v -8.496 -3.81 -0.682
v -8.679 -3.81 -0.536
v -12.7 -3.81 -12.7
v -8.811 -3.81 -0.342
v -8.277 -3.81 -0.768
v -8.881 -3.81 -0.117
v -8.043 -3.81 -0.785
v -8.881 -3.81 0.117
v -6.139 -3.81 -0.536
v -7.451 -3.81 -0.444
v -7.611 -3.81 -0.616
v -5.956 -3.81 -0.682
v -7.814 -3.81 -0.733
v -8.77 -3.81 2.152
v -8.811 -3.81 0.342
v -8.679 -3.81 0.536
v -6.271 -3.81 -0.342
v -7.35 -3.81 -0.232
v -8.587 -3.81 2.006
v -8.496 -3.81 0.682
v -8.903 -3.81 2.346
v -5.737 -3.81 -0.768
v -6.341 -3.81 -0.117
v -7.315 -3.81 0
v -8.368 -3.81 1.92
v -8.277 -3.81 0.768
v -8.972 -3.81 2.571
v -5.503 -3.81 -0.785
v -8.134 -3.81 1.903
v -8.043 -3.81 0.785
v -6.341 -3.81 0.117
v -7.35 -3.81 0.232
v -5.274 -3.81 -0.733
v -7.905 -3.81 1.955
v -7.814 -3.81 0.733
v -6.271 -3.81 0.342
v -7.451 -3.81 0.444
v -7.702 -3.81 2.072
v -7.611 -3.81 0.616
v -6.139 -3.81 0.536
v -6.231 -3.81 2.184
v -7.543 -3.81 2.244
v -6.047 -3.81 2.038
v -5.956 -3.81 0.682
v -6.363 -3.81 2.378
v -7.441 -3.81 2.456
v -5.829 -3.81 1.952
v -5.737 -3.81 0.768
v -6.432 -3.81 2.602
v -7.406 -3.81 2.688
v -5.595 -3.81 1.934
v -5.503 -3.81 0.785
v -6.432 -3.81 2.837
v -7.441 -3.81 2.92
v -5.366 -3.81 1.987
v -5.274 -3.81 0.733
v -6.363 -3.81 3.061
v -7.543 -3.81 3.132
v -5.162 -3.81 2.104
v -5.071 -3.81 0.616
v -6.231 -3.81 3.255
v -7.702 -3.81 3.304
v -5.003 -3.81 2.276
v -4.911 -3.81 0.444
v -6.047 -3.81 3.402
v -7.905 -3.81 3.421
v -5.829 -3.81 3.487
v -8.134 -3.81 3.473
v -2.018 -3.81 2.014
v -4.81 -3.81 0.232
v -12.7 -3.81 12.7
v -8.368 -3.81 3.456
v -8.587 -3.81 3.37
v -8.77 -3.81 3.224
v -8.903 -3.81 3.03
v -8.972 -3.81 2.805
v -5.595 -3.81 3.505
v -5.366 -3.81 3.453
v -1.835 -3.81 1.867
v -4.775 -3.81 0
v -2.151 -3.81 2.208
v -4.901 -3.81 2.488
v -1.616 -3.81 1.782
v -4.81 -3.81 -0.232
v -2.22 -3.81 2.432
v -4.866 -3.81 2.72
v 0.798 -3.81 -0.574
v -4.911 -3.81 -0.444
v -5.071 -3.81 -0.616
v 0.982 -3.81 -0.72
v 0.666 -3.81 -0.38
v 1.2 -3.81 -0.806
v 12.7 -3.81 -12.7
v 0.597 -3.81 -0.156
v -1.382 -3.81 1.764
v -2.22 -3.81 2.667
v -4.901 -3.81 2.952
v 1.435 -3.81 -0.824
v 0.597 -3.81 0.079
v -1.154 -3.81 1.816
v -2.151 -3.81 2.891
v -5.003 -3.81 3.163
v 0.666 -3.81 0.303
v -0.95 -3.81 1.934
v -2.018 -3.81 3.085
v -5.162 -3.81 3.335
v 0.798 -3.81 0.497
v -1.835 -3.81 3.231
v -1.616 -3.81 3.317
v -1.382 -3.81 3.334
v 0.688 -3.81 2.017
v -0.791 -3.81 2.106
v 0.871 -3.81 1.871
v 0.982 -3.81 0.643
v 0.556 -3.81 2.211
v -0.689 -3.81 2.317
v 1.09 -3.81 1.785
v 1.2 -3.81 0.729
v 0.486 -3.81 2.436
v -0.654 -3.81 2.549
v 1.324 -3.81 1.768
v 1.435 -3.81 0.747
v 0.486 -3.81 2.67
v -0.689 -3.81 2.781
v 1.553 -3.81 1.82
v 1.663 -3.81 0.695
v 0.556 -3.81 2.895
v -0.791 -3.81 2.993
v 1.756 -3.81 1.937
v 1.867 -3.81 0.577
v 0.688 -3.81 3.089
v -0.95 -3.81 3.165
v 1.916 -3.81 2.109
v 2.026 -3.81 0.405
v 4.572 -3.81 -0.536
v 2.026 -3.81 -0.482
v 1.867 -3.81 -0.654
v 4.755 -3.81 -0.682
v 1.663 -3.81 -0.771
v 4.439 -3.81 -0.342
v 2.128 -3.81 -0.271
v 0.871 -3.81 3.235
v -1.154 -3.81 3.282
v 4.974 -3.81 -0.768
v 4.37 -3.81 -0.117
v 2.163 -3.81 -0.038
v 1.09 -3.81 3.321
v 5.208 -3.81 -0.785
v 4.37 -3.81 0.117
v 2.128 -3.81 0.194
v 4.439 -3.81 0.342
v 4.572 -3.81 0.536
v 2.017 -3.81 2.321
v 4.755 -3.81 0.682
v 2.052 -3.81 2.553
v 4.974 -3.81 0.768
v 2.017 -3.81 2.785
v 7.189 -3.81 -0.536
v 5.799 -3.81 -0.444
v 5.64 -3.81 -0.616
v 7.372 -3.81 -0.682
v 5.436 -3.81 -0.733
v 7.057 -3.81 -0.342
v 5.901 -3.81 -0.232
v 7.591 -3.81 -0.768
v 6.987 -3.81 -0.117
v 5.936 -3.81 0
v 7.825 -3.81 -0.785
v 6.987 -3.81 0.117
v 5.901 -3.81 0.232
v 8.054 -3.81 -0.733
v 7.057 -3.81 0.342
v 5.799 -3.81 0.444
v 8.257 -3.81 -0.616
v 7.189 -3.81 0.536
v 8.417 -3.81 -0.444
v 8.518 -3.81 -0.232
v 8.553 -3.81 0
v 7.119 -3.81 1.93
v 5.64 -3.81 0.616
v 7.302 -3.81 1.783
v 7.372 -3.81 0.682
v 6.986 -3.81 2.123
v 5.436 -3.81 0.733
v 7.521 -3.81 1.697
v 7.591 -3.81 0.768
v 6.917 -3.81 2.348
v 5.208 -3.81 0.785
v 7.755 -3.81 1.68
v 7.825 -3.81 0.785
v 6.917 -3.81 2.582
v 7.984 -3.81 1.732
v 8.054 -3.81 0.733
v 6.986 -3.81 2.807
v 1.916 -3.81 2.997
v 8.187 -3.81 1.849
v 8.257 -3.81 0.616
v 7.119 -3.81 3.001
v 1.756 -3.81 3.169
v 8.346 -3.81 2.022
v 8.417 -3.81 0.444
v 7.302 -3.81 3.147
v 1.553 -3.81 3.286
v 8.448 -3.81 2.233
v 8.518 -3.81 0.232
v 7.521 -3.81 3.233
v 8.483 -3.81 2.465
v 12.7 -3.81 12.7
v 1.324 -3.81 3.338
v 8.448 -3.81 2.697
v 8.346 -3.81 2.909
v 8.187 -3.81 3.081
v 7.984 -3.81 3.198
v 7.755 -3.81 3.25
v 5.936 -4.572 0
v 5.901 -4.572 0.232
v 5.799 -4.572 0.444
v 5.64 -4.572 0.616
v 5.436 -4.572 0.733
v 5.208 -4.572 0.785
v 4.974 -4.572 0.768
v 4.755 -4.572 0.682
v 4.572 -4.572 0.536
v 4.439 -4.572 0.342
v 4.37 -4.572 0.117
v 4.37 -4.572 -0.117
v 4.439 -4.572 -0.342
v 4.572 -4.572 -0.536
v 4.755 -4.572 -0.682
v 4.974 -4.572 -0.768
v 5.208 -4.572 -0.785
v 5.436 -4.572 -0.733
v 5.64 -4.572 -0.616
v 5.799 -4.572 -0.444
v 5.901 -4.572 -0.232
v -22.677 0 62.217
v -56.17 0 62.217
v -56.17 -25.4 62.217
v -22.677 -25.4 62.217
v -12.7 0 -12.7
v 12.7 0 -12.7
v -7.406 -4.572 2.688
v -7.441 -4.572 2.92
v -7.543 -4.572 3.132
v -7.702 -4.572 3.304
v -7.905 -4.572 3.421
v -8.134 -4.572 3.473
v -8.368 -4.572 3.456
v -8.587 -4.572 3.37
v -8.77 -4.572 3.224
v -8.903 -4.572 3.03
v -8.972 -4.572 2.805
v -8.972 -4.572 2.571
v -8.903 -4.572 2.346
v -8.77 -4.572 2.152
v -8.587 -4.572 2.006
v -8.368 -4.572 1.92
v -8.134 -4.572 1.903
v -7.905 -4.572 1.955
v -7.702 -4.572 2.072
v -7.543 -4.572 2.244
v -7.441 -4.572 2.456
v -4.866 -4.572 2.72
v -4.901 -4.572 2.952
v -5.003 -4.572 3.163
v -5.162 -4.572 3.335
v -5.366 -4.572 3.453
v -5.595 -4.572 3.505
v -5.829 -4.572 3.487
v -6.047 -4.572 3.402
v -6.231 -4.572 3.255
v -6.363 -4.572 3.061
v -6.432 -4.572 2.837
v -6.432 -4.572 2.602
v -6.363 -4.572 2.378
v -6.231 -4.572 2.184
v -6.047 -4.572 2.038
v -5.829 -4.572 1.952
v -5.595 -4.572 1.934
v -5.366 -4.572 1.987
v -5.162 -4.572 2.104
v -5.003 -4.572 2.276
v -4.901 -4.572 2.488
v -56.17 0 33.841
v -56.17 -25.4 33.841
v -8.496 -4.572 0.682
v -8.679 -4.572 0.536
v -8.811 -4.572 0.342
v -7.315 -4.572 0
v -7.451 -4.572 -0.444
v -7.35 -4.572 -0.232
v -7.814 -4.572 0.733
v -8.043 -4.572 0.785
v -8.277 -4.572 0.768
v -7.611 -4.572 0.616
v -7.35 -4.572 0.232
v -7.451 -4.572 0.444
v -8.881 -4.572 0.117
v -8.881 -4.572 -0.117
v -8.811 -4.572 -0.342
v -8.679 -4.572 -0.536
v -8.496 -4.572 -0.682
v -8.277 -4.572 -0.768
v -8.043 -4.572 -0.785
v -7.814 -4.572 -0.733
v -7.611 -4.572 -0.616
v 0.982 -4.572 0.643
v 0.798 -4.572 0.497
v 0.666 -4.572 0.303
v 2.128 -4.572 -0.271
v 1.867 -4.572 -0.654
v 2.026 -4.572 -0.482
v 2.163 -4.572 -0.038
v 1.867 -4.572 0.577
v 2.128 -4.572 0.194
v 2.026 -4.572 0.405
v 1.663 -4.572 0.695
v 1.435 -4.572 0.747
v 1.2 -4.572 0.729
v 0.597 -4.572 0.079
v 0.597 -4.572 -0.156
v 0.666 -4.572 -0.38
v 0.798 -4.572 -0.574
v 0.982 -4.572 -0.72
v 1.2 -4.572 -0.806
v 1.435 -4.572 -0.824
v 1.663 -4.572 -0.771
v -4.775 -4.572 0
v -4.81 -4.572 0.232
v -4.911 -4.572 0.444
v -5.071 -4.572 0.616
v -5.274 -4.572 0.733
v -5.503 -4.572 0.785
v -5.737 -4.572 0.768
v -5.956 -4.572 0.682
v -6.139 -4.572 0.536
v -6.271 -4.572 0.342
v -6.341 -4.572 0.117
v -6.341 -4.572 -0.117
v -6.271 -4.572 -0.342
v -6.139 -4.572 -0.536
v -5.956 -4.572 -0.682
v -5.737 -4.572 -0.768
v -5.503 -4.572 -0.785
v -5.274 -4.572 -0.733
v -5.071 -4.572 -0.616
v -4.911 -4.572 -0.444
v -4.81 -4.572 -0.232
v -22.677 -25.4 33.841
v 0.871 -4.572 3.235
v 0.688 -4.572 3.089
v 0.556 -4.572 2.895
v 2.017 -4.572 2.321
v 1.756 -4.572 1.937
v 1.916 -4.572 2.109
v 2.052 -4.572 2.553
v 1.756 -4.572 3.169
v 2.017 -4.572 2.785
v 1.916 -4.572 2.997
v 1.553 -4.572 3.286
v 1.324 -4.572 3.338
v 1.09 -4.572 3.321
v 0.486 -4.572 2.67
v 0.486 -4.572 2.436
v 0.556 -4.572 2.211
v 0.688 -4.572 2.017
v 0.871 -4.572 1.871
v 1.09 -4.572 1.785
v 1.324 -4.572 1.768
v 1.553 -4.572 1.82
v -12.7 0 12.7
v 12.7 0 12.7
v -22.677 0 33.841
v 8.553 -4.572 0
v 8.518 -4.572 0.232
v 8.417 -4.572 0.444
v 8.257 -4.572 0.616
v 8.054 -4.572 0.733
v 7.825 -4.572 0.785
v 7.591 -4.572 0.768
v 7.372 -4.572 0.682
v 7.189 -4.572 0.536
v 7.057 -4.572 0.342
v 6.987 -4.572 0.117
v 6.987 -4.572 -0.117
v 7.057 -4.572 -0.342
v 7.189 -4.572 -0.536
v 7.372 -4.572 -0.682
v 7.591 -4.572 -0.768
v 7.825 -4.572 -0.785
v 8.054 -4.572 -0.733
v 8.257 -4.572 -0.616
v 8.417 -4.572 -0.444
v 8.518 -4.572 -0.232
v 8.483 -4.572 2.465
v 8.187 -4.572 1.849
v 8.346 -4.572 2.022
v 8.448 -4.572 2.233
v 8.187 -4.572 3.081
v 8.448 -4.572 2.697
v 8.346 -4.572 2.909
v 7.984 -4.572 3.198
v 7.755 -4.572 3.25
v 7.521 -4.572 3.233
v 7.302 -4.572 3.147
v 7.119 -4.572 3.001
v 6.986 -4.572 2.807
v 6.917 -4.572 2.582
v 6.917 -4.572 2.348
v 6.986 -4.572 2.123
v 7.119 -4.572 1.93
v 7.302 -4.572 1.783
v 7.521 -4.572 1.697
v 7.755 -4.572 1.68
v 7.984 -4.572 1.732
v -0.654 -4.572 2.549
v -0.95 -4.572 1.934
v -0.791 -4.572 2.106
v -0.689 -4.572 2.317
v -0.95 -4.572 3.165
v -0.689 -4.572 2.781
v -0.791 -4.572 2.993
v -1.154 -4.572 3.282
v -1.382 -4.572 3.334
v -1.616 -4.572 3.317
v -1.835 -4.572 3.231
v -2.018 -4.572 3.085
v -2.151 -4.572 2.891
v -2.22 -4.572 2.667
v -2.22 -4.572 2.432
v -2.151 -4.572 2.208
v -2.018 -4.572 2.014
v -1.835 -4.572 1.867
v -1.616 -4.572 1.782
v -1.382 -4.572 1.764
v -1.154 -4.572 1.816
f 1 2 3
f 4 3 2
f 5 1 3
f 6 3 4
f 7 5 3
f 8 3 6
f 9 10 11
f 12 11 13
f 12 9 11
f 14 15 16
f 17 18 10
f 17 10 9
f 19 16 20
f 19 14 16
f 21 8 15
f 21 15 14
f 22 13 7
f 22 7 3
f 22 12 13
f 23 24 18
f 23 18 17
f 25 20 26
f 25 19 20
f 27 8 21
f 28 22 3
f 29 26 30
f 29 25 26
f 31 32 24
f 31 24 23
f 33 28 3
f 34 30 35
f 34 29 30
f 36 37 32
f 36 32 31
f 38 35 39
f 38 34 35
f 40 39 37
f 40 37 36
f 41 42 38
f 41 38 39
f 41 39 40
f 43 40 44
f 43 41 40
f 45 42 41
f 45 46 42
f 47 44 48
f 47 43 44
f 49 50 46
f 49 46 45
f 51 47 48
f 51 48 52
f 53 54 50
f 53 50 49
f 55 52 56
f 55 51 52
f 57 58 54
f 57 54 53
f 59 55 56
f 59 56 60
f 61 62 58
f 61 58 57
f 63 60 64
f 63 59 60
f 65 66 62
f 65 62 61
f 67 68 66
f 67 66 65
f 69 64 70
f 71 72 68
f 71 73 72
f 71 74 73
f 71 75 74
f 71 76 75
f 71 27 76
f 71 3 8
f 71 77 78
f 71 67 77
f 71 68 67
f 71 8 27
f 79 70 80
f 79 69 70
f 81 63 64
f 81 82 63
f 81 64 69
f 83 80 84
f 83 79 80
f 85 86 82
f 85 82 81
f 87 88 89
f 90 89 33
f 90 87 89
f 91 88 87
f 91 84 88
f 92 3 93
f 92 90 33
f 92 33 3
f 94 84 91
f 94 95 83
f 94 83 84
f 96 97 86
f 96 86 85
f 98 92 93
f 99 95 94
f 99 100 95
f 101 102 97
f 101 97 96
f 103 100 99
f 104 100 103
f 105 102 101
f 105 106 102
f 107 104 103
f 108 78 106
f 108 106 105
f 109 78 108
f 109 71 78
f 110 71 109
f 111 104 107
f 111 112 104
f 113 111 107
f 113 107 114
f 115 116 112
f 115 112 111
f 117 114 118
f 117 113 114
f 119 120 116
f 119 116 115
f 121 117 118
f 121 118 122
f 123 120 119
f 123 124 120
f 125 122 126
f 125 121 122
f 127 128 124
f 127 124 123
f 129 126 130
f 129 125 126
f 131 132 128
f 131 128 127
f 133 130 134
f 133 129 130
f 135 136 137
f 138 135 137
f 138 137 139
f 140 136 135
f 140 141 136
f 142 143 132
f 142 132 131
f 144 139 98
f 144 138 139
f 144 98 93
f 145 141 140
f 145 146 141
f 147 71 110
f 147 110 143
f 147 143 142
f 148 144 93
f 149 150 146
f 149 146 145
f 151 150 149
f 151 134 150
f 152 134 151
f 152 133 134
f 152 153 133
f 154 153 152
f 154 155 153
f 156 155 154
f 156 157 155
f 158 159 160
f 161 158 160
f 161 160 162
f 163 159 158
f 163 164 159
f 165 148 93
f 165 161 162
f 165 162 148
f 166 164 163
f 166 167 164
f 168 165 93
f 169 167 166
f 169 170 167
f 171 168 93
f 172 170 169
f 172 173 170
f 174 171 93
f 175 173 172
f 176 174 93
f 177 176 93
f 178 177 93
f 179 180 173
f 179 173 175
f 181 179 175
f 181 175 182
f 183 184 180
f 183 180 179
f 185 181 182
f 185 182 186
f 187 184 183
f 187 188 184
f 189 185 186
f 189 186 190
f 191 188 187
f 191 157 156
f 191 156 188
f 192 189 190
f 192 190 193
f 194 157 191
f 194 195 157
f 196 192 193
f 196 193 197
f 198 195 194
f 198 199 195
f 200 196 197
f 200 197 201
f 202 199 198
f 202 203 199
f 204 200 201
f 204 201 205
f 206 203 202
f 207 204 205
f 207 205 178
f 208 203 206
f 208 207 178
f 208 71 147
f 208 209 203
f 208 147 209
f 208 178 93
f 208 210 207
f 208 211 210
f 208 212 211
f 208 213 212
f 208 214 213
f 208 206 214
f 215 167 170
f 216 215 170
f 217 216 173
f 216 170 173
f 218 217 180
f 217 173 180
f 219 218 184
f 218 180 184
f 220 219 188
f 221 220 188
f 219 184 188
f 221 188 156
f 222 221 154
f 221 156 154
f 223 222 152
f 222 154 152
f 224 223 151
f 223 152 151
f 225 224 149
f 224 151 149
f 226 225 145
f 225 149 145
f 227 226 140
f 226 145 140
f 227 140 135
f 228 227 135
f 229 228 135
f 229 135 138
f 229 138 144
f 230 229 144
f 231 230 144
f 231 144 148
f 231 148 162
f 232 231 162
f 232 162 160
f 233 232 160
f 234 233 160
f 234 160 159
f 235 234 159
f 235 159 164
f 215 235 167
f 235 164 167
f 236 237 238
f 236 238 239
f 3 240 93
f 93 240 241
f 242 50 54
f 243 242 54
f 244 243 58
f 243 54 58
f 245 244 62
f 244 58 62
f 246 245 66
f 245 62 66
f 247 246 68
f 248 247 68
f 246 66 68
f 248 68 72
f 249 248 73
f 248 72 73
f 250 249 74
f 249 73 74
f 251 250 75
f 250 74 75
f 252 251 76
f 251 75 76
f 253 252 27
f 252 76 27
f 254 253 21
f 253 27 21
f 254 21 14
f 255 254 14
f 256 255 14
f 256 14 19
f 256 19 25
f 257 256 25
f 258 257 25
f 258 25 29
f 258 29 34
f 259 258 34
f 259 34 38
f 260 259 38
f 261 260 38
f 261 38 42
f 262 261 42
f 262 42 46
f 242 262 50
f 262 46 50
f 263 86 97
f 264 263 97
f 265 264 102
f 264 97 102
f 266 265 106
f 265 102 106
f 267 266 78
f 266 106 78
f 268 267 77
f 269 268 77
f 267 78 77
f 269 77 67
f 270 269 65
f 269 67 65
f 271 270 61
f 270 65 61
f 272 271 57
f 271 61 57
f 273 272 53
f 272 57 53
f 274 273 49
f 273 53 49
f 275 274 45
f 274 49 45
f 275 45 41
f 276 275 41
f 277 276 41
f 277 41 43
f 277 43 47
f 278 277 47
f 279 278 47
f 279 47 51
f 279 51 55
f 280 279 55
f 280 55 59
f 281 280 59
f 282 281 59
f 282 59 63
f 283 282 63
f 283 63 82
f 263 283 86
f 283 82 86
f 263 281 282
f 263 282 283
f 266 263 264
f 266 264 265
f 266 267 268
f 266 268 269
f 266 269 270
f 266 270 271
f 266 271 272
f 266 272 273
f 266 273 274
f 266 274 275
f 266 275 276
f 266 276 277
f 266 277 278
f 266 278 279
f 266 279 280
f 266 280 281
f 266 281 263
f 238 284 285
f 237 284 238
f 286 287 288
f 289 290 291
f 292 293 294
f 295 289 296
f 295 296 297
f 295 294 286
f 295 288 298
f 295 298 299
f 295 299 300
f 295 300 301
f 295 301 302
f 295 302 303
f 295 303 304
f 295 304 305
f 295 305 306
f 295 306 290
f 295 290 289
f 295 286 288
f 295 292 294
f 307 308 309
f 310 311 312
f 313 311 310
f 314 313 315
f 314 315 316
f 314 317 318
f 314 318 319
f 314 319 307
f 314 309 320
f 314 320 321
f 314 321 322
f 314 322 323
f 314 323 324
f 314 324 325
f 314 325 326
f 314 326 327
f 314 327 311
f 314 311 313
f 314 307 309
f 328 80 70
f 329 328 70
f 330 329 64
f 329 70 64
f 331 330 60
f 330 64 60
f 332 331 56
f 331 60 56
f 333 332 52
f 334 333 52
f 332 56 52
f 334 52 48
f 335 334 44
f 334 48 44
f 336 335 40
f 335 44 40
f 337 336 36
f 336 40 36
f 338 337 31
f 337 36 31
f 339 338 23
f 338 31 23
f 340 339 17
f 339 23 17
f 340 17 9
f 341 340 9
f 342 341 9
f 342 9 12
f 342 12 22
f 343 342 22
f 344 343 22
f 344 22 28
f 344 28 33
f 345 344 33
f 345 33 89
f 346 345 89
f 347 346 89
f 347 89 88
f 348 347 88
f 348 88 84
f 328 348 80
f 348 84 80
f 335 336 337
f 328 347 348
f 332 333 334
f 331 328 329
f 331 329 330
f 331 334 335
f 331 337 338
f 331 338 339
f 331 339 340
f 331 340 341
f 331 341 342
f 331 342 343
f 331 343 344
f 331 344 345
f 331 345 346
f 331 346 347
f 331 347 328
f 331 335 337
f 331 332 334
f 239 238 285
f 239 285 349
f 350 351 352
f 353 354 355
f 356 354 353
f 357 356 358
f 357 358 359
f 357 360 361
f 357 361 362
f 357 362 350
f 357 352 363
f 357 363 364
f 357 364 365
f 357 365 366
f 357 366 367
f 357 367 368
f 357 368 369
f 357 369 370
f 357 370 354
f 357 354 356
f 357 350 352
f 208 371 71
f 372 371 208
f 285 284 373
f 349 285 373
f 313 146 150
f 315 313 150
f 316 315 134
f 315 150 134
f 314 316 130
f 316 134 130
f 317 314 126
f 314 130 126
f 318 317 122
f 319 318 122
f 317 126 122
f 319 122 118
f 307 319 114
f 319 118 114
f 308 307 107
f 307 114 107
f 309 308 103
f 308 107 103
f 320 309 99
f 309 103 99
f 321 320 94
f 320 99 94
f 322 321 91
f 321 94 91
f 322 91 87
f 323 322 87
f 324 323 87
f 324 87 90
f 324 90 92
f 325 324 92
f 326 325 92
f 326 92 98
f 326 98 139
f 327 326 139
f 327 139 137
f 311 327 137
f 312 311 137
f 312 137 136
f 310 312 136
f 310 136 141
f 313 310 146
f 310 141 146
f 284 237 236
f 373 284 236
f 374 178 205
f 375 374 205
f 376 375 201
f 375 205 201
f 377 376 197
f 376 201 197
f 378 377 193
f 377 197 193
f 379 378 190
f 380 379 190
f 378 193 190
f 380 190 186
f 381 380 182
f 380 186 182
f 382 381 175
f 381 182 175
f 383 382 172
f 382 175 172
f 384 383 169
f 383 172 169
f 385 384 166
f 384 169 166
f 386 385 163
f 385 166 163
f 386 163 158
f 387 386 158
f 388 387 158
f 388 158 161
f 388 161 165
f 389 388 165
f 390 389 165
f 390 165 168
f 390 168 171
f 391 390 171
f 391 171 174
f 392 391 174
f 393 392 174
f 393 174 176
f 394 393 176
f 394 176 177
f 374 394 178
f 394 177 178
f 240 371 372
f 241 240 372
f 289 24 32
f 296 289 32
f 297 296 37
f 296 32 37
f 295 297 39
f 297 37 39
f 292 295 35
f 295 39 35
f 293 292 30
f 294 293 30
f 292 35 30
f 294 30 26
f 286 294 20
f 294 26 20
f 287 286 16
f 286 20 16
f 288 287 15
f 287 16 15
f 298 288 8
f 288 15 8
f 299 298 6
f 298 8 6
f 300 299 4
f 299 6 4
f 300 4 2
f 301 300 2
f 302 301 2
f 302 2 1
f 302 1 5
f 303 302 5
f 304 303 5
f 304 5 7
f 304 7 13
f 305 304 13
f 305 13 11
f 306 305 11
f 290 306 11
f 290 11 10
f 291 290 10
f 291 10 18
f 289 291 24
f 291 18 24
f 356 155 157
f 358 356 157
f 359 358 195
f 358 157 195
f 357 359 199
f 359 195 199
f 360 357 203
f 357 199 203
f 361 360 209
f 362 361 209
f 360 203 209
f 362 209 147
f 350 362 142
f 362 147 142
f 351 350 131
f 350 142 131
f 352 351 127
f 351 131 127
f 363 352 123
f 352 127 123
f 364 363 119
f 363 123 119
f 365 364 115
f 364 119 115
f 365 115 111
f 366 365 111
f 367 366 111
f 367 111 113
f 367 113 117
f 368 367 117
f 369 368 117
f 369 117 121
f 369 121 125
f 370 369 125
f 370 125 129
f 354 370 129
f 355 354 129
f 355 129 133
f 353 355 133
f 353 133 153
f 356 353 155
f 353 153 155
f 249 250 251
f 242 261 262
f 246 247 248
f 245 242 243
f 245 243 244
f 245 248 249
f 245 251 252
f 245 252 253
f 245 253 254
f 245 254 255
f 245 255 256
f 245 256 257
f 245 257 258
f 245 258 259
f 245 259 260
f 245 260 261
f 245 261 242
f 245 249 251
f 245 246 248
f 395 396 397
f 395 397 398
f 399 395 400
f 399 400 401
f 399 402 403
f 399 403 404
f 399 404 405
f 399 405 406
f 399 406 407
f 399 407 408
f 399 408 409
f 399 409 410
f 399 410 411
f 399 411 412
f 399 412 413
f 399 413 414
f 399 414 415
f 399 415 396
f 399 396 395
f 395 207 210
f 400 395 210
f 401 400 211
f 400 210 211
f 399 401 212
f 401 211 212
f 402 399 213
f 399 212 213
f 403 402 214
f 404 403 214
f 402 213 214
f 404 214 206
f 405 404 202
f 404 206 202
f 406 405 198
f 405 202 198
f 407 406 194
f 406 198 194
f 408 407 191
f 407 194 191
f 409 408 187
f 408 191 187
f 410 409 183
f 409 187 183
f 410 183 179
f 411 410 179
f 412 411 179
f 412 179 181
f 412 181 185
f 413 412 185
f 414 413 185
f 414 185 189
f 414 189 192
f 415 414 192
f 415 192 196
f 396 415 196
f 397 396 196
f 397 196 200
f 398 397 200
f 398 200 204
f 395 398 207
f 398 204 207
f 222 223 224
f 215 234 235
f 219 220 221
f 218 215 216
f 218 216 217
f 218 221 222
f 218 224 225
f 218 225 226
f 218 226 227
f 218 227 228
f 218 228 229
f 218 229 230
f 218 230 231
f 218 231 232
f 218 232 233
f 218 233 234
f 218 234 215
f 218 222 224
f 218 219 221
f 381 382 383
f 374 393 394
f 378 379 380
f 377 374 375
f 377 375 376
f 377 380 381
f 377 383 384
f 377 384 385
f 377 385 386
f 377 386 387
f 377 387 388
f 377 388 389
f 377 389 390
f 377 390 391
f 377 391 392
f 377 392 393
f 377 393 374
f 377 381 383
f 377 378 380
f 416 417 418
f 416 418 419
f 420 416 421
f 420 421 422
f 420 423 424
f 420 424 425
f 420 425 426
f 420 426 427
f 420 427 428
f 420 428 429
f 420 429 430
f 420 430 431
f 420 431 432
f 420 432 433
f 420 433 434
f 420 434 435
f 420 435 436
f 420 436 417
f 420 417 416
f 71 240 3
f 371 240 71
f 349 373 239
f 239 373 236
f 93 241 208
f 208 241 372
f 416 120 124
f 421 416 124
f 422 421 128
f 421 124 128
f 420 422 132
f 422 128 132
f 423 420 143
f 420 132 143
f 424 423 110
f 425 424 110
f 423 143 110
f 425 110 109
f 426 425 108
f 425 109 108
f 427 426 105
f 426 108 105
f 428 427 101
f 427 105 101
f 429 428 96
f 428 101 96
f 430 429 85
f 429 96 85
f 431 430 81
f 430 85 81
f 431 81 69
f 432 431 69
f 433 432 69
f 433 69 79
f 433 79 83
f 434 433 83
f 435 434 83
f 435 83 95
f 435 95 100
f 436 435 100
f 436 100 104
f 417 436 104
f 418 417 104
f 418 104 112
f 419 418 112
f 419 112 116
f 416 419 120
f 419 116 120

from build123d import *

# Parameters (mm, degrees)
F0_W     = 25.4
F0_H     = 25.4
F1_DEPTH = 3.81
F3_R     = 0.7874
F5_R     = 0.7874
F4_R     = 0.7874
F6_DEPTH = 0.762
F7_W     = 33.492558
F7_H     = 28.37564
F8_DEPTH = 25.4


with BuildPart() as f1:
    # F0 (on Front) → F1 (new body)
    with BuildSketch(Plane.XZ):
        Rectangle(F0_W, F0_H)
    extrude(amount=F1_DEPTH)

    # F3 (on face) + F5 (on face) + F4 (on face) → F6 (join)
    with BuildSketch(Plane.XZ.offset(3.81)):
        with Locations((-5.562056, 0)):
            Circle(F3_R)
        with Locations((-8.102056, 0)):
            Circle(F3_R)
        with Locations((-8.193153, 2.68803)):
            Circle(F3_R)
        with Locations((-5.653349, 2.719607)):
            Circle(F3_R)
    with BuildSketch(Plane.XZ.offset(3.81)):
        with Locations((7.695833, 2.465096)):
            Circle(F5_R)
        with Locations((5.148814, 0)):
            Circle(F5_R)
        with Locations((7.765962, 0)):
            Circle(F5_R)
    with BuildSketch(Plane.XZ.offset(3.81)):
        with Locations((1.375696, -0.038461)):
            Circle(F4_R)
        with Locations((-1.44127, 2.549272)):
            Circle(F4_R)
        with Locations((1.26496, 2.552998)):
            Circle(F4_R)
    extrude(amount=F6_DEPTH)


with BuildPart() as f8:
    # F7 (on Front) → F8 (new body)
    with BuildSketch(Plane.XZ):
        with Locations((-39.423533, 48.029259)):
            Rectangle(F7_W, F7_H)
    extrude(amount=F8_DEPTH)


solid = Compound([f1.part, f8.part])
